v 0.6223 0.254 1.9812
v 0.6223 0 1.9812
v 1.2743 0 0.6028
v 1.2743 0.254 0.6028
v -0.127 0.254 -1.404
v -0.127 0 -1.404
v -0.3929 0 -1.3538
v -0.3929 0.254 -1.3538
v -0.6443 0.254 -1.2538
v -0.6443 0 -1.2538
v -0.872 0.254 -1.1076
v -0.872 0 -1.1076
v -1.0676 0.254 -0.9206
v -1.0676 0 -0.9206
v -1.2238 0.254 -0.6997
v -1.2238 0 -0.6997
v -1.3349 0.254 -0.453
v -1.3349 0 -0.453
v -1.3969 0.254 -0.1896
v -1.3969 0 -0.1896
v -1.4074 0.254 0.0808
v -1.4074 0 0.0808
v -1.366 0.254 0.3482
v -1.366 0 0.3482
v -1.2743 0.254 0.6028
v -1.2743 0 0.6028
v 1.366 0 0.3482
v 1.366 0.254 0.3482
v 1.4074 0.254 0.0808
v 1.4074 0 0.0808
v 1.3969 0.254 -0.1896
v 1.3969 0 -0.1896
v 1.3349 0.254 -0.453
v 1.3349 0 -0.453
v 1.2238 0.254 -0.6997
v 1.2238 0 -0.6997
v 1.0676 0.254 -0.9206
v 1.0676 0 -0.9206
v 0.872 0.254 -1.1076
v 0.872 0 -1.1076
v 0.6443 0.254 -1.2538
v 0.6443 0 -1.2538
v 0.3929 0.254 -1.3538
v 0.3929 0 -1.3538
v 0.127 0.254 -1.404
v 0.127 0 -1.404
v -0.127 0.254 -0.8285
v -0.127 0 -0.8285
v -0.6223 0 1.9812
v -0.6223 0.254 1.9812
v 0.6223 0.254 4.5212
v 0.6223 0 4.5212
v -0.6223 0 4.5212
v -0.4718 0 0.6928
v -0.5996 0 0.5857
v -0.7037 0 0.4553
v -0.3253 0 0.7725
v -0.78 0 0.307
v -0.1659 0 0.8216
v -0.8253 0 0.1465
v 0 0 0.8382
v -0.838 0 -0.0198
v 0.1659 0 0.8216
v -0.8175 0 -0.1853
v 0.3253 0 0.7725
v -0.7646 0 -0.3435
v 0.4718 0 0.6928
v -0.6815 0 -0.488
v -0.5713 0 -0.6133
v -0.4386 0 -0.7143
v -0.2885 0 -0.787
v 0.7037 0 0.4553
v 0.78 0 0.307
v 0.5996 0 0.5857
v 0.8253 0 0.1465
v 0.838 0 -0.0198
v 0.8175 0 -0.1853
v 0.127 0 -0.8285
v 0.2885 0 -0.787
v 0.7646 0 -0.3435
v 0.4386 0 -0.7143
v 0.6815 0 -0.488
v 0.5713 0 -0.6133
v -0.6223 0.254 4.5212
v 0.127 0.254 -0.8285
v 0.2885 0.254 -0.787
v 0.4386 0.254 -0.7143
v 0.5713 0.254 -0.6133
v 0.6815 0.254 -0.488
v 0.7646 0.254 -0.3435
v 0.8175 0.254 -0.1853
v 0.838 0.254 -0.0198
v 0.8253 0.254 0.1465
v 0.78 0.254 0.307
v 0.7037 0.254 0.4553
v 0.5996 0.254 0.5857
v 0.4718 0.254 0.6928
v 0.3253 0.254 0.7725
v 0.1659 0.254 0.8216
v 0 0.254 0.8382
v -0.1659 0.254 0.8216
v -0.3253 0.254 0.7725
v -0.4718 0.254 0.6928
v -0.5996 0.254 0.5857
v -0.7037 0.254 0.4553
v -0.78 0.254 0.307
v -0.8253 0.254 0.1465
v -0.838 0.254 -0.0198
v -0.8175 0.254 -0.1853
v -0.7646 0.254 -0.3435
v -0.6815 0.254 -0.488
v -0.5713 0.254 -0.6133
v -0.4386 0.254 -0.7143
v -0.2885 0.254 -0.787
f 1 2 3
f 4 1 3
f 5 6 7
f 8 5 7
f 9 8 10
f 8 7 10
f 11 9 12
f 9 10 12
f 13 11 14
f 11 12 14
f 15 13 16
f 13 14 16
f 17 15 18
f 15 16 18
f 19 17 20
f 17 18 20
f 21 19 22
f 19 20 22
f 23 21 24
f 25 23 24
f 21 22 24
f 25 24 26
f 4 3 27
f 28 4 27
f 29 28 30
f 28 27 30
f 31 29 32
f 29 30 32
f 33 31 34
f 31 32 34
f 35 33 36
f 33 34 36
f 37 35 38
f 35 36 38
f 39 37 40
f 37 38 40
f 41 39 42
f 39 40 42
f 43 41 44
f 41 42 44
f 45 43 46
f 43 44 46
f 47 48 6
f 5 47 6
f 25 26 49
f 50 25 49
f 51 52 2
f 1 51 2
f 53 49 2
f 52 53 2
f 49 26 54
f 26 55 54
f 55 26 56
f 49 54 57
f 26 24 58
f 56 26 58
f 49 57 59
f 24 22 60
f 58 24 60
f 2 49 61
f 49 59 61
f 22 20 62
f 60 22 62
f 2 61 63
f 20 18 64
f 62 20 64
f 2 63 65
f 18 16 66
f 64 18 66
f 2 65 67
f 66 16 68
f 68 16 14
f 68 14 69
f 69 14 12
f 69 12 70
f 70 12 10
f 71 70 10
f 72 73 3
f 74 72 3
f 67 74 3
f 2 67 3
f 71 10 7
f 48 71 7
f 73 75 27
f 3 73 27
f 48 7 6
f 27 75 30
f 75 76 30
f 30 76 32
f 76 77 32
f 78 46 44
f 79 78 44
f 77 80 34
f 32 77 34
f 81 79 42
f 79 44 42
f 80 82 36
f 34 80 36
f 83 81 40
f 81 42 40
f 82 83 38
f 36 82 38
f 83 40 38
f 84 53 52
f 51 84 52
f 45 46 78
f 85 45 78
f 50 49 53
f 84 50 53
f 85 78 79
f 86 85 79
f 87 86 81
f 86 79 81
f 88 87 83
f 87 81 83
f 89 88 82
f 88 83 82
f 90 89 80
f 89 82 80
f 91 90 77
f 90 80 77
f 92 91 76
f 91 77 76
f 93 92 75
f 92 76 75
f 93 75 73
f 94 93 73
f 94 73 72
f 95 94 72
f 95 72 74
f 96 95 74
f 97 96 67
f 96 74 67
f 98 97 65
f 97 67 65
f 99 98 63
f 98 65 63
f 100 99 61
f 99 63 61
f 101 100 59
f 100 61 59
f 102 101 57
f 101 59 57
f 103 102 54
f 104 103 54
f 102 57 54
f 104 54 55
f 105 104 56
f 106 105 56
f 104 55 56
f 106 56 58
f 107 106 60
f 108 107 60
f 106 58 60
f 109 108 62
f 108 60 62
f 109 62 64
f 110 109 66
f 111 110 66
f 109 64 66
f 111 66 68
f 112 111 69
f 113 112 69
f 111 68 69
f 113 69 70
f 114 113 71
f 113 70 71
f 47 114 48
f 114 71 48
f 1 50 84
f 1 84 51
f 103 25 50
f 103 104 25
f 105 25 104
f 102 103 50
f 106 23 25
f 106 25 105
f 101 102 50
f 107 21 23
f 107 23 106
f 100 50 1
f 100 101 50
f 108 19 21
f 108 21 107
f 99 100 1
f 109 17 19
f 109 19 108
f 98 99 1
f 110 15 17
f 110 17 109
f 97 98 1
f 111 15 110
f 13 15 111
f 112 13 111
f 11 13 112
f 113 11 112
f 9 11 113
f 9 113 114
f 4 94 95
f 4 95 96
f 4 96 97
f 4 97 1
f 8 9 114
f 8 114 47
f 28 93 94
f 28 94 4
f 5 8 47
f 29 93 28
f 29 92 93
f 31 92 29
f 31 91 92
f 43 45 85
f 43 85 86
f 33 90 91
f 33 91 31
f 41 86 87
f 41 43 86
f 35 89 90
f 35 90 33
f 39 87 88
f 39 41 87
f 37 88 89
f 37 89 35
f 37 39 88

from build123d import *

# Parameters (mm, degrees)
BOSS_EXTRUDE1_DEPTH = 0.254


with BuildPart() as part:
    # Sketch1 → Boss-Extrude1 (new body)
    with BuildSketch(Plane(origin=(0, 0, 0), x_dir=(1, 0, 0), z_dir=(0, 1, 0))):
        with BuildLine():
            Line((0.6223, -1.9812), (1.274323937, -0.602787353))
            ThreePointArc((1.274323937, -0.602787353), (1.223802917, 0.699686009), (0.127, 1.403967624))
            Line((0.127, 1.403967624), (0.127, 0.828522927))
            ThreePointArc((0.127, 0.828522927), (0, -0.8382), (-0.127, 0.828522927))
            Line((-0.127, 0.828522927), (-0.127, 1.403967624))
            ThreePointArc((-0.127, 1.403967624), (-1.223802917, 0.699686009), (-1.274323937, -0.602787353))
            Line((-1.274323937, -0.602787353), (-0.6223, -1.9812))
            Line((-0.6223, -1.9812), (-0.6223, -4.5212))
            Line((-0.6223, -4.5212), (0.6223, -4.5212))
            Line((0.6223, -4.5212), (0.6223, -1.9812))
        make_face()
    extrude(amount=BOSS_EXTRUDE1_DEPTH)


solid = part.part
